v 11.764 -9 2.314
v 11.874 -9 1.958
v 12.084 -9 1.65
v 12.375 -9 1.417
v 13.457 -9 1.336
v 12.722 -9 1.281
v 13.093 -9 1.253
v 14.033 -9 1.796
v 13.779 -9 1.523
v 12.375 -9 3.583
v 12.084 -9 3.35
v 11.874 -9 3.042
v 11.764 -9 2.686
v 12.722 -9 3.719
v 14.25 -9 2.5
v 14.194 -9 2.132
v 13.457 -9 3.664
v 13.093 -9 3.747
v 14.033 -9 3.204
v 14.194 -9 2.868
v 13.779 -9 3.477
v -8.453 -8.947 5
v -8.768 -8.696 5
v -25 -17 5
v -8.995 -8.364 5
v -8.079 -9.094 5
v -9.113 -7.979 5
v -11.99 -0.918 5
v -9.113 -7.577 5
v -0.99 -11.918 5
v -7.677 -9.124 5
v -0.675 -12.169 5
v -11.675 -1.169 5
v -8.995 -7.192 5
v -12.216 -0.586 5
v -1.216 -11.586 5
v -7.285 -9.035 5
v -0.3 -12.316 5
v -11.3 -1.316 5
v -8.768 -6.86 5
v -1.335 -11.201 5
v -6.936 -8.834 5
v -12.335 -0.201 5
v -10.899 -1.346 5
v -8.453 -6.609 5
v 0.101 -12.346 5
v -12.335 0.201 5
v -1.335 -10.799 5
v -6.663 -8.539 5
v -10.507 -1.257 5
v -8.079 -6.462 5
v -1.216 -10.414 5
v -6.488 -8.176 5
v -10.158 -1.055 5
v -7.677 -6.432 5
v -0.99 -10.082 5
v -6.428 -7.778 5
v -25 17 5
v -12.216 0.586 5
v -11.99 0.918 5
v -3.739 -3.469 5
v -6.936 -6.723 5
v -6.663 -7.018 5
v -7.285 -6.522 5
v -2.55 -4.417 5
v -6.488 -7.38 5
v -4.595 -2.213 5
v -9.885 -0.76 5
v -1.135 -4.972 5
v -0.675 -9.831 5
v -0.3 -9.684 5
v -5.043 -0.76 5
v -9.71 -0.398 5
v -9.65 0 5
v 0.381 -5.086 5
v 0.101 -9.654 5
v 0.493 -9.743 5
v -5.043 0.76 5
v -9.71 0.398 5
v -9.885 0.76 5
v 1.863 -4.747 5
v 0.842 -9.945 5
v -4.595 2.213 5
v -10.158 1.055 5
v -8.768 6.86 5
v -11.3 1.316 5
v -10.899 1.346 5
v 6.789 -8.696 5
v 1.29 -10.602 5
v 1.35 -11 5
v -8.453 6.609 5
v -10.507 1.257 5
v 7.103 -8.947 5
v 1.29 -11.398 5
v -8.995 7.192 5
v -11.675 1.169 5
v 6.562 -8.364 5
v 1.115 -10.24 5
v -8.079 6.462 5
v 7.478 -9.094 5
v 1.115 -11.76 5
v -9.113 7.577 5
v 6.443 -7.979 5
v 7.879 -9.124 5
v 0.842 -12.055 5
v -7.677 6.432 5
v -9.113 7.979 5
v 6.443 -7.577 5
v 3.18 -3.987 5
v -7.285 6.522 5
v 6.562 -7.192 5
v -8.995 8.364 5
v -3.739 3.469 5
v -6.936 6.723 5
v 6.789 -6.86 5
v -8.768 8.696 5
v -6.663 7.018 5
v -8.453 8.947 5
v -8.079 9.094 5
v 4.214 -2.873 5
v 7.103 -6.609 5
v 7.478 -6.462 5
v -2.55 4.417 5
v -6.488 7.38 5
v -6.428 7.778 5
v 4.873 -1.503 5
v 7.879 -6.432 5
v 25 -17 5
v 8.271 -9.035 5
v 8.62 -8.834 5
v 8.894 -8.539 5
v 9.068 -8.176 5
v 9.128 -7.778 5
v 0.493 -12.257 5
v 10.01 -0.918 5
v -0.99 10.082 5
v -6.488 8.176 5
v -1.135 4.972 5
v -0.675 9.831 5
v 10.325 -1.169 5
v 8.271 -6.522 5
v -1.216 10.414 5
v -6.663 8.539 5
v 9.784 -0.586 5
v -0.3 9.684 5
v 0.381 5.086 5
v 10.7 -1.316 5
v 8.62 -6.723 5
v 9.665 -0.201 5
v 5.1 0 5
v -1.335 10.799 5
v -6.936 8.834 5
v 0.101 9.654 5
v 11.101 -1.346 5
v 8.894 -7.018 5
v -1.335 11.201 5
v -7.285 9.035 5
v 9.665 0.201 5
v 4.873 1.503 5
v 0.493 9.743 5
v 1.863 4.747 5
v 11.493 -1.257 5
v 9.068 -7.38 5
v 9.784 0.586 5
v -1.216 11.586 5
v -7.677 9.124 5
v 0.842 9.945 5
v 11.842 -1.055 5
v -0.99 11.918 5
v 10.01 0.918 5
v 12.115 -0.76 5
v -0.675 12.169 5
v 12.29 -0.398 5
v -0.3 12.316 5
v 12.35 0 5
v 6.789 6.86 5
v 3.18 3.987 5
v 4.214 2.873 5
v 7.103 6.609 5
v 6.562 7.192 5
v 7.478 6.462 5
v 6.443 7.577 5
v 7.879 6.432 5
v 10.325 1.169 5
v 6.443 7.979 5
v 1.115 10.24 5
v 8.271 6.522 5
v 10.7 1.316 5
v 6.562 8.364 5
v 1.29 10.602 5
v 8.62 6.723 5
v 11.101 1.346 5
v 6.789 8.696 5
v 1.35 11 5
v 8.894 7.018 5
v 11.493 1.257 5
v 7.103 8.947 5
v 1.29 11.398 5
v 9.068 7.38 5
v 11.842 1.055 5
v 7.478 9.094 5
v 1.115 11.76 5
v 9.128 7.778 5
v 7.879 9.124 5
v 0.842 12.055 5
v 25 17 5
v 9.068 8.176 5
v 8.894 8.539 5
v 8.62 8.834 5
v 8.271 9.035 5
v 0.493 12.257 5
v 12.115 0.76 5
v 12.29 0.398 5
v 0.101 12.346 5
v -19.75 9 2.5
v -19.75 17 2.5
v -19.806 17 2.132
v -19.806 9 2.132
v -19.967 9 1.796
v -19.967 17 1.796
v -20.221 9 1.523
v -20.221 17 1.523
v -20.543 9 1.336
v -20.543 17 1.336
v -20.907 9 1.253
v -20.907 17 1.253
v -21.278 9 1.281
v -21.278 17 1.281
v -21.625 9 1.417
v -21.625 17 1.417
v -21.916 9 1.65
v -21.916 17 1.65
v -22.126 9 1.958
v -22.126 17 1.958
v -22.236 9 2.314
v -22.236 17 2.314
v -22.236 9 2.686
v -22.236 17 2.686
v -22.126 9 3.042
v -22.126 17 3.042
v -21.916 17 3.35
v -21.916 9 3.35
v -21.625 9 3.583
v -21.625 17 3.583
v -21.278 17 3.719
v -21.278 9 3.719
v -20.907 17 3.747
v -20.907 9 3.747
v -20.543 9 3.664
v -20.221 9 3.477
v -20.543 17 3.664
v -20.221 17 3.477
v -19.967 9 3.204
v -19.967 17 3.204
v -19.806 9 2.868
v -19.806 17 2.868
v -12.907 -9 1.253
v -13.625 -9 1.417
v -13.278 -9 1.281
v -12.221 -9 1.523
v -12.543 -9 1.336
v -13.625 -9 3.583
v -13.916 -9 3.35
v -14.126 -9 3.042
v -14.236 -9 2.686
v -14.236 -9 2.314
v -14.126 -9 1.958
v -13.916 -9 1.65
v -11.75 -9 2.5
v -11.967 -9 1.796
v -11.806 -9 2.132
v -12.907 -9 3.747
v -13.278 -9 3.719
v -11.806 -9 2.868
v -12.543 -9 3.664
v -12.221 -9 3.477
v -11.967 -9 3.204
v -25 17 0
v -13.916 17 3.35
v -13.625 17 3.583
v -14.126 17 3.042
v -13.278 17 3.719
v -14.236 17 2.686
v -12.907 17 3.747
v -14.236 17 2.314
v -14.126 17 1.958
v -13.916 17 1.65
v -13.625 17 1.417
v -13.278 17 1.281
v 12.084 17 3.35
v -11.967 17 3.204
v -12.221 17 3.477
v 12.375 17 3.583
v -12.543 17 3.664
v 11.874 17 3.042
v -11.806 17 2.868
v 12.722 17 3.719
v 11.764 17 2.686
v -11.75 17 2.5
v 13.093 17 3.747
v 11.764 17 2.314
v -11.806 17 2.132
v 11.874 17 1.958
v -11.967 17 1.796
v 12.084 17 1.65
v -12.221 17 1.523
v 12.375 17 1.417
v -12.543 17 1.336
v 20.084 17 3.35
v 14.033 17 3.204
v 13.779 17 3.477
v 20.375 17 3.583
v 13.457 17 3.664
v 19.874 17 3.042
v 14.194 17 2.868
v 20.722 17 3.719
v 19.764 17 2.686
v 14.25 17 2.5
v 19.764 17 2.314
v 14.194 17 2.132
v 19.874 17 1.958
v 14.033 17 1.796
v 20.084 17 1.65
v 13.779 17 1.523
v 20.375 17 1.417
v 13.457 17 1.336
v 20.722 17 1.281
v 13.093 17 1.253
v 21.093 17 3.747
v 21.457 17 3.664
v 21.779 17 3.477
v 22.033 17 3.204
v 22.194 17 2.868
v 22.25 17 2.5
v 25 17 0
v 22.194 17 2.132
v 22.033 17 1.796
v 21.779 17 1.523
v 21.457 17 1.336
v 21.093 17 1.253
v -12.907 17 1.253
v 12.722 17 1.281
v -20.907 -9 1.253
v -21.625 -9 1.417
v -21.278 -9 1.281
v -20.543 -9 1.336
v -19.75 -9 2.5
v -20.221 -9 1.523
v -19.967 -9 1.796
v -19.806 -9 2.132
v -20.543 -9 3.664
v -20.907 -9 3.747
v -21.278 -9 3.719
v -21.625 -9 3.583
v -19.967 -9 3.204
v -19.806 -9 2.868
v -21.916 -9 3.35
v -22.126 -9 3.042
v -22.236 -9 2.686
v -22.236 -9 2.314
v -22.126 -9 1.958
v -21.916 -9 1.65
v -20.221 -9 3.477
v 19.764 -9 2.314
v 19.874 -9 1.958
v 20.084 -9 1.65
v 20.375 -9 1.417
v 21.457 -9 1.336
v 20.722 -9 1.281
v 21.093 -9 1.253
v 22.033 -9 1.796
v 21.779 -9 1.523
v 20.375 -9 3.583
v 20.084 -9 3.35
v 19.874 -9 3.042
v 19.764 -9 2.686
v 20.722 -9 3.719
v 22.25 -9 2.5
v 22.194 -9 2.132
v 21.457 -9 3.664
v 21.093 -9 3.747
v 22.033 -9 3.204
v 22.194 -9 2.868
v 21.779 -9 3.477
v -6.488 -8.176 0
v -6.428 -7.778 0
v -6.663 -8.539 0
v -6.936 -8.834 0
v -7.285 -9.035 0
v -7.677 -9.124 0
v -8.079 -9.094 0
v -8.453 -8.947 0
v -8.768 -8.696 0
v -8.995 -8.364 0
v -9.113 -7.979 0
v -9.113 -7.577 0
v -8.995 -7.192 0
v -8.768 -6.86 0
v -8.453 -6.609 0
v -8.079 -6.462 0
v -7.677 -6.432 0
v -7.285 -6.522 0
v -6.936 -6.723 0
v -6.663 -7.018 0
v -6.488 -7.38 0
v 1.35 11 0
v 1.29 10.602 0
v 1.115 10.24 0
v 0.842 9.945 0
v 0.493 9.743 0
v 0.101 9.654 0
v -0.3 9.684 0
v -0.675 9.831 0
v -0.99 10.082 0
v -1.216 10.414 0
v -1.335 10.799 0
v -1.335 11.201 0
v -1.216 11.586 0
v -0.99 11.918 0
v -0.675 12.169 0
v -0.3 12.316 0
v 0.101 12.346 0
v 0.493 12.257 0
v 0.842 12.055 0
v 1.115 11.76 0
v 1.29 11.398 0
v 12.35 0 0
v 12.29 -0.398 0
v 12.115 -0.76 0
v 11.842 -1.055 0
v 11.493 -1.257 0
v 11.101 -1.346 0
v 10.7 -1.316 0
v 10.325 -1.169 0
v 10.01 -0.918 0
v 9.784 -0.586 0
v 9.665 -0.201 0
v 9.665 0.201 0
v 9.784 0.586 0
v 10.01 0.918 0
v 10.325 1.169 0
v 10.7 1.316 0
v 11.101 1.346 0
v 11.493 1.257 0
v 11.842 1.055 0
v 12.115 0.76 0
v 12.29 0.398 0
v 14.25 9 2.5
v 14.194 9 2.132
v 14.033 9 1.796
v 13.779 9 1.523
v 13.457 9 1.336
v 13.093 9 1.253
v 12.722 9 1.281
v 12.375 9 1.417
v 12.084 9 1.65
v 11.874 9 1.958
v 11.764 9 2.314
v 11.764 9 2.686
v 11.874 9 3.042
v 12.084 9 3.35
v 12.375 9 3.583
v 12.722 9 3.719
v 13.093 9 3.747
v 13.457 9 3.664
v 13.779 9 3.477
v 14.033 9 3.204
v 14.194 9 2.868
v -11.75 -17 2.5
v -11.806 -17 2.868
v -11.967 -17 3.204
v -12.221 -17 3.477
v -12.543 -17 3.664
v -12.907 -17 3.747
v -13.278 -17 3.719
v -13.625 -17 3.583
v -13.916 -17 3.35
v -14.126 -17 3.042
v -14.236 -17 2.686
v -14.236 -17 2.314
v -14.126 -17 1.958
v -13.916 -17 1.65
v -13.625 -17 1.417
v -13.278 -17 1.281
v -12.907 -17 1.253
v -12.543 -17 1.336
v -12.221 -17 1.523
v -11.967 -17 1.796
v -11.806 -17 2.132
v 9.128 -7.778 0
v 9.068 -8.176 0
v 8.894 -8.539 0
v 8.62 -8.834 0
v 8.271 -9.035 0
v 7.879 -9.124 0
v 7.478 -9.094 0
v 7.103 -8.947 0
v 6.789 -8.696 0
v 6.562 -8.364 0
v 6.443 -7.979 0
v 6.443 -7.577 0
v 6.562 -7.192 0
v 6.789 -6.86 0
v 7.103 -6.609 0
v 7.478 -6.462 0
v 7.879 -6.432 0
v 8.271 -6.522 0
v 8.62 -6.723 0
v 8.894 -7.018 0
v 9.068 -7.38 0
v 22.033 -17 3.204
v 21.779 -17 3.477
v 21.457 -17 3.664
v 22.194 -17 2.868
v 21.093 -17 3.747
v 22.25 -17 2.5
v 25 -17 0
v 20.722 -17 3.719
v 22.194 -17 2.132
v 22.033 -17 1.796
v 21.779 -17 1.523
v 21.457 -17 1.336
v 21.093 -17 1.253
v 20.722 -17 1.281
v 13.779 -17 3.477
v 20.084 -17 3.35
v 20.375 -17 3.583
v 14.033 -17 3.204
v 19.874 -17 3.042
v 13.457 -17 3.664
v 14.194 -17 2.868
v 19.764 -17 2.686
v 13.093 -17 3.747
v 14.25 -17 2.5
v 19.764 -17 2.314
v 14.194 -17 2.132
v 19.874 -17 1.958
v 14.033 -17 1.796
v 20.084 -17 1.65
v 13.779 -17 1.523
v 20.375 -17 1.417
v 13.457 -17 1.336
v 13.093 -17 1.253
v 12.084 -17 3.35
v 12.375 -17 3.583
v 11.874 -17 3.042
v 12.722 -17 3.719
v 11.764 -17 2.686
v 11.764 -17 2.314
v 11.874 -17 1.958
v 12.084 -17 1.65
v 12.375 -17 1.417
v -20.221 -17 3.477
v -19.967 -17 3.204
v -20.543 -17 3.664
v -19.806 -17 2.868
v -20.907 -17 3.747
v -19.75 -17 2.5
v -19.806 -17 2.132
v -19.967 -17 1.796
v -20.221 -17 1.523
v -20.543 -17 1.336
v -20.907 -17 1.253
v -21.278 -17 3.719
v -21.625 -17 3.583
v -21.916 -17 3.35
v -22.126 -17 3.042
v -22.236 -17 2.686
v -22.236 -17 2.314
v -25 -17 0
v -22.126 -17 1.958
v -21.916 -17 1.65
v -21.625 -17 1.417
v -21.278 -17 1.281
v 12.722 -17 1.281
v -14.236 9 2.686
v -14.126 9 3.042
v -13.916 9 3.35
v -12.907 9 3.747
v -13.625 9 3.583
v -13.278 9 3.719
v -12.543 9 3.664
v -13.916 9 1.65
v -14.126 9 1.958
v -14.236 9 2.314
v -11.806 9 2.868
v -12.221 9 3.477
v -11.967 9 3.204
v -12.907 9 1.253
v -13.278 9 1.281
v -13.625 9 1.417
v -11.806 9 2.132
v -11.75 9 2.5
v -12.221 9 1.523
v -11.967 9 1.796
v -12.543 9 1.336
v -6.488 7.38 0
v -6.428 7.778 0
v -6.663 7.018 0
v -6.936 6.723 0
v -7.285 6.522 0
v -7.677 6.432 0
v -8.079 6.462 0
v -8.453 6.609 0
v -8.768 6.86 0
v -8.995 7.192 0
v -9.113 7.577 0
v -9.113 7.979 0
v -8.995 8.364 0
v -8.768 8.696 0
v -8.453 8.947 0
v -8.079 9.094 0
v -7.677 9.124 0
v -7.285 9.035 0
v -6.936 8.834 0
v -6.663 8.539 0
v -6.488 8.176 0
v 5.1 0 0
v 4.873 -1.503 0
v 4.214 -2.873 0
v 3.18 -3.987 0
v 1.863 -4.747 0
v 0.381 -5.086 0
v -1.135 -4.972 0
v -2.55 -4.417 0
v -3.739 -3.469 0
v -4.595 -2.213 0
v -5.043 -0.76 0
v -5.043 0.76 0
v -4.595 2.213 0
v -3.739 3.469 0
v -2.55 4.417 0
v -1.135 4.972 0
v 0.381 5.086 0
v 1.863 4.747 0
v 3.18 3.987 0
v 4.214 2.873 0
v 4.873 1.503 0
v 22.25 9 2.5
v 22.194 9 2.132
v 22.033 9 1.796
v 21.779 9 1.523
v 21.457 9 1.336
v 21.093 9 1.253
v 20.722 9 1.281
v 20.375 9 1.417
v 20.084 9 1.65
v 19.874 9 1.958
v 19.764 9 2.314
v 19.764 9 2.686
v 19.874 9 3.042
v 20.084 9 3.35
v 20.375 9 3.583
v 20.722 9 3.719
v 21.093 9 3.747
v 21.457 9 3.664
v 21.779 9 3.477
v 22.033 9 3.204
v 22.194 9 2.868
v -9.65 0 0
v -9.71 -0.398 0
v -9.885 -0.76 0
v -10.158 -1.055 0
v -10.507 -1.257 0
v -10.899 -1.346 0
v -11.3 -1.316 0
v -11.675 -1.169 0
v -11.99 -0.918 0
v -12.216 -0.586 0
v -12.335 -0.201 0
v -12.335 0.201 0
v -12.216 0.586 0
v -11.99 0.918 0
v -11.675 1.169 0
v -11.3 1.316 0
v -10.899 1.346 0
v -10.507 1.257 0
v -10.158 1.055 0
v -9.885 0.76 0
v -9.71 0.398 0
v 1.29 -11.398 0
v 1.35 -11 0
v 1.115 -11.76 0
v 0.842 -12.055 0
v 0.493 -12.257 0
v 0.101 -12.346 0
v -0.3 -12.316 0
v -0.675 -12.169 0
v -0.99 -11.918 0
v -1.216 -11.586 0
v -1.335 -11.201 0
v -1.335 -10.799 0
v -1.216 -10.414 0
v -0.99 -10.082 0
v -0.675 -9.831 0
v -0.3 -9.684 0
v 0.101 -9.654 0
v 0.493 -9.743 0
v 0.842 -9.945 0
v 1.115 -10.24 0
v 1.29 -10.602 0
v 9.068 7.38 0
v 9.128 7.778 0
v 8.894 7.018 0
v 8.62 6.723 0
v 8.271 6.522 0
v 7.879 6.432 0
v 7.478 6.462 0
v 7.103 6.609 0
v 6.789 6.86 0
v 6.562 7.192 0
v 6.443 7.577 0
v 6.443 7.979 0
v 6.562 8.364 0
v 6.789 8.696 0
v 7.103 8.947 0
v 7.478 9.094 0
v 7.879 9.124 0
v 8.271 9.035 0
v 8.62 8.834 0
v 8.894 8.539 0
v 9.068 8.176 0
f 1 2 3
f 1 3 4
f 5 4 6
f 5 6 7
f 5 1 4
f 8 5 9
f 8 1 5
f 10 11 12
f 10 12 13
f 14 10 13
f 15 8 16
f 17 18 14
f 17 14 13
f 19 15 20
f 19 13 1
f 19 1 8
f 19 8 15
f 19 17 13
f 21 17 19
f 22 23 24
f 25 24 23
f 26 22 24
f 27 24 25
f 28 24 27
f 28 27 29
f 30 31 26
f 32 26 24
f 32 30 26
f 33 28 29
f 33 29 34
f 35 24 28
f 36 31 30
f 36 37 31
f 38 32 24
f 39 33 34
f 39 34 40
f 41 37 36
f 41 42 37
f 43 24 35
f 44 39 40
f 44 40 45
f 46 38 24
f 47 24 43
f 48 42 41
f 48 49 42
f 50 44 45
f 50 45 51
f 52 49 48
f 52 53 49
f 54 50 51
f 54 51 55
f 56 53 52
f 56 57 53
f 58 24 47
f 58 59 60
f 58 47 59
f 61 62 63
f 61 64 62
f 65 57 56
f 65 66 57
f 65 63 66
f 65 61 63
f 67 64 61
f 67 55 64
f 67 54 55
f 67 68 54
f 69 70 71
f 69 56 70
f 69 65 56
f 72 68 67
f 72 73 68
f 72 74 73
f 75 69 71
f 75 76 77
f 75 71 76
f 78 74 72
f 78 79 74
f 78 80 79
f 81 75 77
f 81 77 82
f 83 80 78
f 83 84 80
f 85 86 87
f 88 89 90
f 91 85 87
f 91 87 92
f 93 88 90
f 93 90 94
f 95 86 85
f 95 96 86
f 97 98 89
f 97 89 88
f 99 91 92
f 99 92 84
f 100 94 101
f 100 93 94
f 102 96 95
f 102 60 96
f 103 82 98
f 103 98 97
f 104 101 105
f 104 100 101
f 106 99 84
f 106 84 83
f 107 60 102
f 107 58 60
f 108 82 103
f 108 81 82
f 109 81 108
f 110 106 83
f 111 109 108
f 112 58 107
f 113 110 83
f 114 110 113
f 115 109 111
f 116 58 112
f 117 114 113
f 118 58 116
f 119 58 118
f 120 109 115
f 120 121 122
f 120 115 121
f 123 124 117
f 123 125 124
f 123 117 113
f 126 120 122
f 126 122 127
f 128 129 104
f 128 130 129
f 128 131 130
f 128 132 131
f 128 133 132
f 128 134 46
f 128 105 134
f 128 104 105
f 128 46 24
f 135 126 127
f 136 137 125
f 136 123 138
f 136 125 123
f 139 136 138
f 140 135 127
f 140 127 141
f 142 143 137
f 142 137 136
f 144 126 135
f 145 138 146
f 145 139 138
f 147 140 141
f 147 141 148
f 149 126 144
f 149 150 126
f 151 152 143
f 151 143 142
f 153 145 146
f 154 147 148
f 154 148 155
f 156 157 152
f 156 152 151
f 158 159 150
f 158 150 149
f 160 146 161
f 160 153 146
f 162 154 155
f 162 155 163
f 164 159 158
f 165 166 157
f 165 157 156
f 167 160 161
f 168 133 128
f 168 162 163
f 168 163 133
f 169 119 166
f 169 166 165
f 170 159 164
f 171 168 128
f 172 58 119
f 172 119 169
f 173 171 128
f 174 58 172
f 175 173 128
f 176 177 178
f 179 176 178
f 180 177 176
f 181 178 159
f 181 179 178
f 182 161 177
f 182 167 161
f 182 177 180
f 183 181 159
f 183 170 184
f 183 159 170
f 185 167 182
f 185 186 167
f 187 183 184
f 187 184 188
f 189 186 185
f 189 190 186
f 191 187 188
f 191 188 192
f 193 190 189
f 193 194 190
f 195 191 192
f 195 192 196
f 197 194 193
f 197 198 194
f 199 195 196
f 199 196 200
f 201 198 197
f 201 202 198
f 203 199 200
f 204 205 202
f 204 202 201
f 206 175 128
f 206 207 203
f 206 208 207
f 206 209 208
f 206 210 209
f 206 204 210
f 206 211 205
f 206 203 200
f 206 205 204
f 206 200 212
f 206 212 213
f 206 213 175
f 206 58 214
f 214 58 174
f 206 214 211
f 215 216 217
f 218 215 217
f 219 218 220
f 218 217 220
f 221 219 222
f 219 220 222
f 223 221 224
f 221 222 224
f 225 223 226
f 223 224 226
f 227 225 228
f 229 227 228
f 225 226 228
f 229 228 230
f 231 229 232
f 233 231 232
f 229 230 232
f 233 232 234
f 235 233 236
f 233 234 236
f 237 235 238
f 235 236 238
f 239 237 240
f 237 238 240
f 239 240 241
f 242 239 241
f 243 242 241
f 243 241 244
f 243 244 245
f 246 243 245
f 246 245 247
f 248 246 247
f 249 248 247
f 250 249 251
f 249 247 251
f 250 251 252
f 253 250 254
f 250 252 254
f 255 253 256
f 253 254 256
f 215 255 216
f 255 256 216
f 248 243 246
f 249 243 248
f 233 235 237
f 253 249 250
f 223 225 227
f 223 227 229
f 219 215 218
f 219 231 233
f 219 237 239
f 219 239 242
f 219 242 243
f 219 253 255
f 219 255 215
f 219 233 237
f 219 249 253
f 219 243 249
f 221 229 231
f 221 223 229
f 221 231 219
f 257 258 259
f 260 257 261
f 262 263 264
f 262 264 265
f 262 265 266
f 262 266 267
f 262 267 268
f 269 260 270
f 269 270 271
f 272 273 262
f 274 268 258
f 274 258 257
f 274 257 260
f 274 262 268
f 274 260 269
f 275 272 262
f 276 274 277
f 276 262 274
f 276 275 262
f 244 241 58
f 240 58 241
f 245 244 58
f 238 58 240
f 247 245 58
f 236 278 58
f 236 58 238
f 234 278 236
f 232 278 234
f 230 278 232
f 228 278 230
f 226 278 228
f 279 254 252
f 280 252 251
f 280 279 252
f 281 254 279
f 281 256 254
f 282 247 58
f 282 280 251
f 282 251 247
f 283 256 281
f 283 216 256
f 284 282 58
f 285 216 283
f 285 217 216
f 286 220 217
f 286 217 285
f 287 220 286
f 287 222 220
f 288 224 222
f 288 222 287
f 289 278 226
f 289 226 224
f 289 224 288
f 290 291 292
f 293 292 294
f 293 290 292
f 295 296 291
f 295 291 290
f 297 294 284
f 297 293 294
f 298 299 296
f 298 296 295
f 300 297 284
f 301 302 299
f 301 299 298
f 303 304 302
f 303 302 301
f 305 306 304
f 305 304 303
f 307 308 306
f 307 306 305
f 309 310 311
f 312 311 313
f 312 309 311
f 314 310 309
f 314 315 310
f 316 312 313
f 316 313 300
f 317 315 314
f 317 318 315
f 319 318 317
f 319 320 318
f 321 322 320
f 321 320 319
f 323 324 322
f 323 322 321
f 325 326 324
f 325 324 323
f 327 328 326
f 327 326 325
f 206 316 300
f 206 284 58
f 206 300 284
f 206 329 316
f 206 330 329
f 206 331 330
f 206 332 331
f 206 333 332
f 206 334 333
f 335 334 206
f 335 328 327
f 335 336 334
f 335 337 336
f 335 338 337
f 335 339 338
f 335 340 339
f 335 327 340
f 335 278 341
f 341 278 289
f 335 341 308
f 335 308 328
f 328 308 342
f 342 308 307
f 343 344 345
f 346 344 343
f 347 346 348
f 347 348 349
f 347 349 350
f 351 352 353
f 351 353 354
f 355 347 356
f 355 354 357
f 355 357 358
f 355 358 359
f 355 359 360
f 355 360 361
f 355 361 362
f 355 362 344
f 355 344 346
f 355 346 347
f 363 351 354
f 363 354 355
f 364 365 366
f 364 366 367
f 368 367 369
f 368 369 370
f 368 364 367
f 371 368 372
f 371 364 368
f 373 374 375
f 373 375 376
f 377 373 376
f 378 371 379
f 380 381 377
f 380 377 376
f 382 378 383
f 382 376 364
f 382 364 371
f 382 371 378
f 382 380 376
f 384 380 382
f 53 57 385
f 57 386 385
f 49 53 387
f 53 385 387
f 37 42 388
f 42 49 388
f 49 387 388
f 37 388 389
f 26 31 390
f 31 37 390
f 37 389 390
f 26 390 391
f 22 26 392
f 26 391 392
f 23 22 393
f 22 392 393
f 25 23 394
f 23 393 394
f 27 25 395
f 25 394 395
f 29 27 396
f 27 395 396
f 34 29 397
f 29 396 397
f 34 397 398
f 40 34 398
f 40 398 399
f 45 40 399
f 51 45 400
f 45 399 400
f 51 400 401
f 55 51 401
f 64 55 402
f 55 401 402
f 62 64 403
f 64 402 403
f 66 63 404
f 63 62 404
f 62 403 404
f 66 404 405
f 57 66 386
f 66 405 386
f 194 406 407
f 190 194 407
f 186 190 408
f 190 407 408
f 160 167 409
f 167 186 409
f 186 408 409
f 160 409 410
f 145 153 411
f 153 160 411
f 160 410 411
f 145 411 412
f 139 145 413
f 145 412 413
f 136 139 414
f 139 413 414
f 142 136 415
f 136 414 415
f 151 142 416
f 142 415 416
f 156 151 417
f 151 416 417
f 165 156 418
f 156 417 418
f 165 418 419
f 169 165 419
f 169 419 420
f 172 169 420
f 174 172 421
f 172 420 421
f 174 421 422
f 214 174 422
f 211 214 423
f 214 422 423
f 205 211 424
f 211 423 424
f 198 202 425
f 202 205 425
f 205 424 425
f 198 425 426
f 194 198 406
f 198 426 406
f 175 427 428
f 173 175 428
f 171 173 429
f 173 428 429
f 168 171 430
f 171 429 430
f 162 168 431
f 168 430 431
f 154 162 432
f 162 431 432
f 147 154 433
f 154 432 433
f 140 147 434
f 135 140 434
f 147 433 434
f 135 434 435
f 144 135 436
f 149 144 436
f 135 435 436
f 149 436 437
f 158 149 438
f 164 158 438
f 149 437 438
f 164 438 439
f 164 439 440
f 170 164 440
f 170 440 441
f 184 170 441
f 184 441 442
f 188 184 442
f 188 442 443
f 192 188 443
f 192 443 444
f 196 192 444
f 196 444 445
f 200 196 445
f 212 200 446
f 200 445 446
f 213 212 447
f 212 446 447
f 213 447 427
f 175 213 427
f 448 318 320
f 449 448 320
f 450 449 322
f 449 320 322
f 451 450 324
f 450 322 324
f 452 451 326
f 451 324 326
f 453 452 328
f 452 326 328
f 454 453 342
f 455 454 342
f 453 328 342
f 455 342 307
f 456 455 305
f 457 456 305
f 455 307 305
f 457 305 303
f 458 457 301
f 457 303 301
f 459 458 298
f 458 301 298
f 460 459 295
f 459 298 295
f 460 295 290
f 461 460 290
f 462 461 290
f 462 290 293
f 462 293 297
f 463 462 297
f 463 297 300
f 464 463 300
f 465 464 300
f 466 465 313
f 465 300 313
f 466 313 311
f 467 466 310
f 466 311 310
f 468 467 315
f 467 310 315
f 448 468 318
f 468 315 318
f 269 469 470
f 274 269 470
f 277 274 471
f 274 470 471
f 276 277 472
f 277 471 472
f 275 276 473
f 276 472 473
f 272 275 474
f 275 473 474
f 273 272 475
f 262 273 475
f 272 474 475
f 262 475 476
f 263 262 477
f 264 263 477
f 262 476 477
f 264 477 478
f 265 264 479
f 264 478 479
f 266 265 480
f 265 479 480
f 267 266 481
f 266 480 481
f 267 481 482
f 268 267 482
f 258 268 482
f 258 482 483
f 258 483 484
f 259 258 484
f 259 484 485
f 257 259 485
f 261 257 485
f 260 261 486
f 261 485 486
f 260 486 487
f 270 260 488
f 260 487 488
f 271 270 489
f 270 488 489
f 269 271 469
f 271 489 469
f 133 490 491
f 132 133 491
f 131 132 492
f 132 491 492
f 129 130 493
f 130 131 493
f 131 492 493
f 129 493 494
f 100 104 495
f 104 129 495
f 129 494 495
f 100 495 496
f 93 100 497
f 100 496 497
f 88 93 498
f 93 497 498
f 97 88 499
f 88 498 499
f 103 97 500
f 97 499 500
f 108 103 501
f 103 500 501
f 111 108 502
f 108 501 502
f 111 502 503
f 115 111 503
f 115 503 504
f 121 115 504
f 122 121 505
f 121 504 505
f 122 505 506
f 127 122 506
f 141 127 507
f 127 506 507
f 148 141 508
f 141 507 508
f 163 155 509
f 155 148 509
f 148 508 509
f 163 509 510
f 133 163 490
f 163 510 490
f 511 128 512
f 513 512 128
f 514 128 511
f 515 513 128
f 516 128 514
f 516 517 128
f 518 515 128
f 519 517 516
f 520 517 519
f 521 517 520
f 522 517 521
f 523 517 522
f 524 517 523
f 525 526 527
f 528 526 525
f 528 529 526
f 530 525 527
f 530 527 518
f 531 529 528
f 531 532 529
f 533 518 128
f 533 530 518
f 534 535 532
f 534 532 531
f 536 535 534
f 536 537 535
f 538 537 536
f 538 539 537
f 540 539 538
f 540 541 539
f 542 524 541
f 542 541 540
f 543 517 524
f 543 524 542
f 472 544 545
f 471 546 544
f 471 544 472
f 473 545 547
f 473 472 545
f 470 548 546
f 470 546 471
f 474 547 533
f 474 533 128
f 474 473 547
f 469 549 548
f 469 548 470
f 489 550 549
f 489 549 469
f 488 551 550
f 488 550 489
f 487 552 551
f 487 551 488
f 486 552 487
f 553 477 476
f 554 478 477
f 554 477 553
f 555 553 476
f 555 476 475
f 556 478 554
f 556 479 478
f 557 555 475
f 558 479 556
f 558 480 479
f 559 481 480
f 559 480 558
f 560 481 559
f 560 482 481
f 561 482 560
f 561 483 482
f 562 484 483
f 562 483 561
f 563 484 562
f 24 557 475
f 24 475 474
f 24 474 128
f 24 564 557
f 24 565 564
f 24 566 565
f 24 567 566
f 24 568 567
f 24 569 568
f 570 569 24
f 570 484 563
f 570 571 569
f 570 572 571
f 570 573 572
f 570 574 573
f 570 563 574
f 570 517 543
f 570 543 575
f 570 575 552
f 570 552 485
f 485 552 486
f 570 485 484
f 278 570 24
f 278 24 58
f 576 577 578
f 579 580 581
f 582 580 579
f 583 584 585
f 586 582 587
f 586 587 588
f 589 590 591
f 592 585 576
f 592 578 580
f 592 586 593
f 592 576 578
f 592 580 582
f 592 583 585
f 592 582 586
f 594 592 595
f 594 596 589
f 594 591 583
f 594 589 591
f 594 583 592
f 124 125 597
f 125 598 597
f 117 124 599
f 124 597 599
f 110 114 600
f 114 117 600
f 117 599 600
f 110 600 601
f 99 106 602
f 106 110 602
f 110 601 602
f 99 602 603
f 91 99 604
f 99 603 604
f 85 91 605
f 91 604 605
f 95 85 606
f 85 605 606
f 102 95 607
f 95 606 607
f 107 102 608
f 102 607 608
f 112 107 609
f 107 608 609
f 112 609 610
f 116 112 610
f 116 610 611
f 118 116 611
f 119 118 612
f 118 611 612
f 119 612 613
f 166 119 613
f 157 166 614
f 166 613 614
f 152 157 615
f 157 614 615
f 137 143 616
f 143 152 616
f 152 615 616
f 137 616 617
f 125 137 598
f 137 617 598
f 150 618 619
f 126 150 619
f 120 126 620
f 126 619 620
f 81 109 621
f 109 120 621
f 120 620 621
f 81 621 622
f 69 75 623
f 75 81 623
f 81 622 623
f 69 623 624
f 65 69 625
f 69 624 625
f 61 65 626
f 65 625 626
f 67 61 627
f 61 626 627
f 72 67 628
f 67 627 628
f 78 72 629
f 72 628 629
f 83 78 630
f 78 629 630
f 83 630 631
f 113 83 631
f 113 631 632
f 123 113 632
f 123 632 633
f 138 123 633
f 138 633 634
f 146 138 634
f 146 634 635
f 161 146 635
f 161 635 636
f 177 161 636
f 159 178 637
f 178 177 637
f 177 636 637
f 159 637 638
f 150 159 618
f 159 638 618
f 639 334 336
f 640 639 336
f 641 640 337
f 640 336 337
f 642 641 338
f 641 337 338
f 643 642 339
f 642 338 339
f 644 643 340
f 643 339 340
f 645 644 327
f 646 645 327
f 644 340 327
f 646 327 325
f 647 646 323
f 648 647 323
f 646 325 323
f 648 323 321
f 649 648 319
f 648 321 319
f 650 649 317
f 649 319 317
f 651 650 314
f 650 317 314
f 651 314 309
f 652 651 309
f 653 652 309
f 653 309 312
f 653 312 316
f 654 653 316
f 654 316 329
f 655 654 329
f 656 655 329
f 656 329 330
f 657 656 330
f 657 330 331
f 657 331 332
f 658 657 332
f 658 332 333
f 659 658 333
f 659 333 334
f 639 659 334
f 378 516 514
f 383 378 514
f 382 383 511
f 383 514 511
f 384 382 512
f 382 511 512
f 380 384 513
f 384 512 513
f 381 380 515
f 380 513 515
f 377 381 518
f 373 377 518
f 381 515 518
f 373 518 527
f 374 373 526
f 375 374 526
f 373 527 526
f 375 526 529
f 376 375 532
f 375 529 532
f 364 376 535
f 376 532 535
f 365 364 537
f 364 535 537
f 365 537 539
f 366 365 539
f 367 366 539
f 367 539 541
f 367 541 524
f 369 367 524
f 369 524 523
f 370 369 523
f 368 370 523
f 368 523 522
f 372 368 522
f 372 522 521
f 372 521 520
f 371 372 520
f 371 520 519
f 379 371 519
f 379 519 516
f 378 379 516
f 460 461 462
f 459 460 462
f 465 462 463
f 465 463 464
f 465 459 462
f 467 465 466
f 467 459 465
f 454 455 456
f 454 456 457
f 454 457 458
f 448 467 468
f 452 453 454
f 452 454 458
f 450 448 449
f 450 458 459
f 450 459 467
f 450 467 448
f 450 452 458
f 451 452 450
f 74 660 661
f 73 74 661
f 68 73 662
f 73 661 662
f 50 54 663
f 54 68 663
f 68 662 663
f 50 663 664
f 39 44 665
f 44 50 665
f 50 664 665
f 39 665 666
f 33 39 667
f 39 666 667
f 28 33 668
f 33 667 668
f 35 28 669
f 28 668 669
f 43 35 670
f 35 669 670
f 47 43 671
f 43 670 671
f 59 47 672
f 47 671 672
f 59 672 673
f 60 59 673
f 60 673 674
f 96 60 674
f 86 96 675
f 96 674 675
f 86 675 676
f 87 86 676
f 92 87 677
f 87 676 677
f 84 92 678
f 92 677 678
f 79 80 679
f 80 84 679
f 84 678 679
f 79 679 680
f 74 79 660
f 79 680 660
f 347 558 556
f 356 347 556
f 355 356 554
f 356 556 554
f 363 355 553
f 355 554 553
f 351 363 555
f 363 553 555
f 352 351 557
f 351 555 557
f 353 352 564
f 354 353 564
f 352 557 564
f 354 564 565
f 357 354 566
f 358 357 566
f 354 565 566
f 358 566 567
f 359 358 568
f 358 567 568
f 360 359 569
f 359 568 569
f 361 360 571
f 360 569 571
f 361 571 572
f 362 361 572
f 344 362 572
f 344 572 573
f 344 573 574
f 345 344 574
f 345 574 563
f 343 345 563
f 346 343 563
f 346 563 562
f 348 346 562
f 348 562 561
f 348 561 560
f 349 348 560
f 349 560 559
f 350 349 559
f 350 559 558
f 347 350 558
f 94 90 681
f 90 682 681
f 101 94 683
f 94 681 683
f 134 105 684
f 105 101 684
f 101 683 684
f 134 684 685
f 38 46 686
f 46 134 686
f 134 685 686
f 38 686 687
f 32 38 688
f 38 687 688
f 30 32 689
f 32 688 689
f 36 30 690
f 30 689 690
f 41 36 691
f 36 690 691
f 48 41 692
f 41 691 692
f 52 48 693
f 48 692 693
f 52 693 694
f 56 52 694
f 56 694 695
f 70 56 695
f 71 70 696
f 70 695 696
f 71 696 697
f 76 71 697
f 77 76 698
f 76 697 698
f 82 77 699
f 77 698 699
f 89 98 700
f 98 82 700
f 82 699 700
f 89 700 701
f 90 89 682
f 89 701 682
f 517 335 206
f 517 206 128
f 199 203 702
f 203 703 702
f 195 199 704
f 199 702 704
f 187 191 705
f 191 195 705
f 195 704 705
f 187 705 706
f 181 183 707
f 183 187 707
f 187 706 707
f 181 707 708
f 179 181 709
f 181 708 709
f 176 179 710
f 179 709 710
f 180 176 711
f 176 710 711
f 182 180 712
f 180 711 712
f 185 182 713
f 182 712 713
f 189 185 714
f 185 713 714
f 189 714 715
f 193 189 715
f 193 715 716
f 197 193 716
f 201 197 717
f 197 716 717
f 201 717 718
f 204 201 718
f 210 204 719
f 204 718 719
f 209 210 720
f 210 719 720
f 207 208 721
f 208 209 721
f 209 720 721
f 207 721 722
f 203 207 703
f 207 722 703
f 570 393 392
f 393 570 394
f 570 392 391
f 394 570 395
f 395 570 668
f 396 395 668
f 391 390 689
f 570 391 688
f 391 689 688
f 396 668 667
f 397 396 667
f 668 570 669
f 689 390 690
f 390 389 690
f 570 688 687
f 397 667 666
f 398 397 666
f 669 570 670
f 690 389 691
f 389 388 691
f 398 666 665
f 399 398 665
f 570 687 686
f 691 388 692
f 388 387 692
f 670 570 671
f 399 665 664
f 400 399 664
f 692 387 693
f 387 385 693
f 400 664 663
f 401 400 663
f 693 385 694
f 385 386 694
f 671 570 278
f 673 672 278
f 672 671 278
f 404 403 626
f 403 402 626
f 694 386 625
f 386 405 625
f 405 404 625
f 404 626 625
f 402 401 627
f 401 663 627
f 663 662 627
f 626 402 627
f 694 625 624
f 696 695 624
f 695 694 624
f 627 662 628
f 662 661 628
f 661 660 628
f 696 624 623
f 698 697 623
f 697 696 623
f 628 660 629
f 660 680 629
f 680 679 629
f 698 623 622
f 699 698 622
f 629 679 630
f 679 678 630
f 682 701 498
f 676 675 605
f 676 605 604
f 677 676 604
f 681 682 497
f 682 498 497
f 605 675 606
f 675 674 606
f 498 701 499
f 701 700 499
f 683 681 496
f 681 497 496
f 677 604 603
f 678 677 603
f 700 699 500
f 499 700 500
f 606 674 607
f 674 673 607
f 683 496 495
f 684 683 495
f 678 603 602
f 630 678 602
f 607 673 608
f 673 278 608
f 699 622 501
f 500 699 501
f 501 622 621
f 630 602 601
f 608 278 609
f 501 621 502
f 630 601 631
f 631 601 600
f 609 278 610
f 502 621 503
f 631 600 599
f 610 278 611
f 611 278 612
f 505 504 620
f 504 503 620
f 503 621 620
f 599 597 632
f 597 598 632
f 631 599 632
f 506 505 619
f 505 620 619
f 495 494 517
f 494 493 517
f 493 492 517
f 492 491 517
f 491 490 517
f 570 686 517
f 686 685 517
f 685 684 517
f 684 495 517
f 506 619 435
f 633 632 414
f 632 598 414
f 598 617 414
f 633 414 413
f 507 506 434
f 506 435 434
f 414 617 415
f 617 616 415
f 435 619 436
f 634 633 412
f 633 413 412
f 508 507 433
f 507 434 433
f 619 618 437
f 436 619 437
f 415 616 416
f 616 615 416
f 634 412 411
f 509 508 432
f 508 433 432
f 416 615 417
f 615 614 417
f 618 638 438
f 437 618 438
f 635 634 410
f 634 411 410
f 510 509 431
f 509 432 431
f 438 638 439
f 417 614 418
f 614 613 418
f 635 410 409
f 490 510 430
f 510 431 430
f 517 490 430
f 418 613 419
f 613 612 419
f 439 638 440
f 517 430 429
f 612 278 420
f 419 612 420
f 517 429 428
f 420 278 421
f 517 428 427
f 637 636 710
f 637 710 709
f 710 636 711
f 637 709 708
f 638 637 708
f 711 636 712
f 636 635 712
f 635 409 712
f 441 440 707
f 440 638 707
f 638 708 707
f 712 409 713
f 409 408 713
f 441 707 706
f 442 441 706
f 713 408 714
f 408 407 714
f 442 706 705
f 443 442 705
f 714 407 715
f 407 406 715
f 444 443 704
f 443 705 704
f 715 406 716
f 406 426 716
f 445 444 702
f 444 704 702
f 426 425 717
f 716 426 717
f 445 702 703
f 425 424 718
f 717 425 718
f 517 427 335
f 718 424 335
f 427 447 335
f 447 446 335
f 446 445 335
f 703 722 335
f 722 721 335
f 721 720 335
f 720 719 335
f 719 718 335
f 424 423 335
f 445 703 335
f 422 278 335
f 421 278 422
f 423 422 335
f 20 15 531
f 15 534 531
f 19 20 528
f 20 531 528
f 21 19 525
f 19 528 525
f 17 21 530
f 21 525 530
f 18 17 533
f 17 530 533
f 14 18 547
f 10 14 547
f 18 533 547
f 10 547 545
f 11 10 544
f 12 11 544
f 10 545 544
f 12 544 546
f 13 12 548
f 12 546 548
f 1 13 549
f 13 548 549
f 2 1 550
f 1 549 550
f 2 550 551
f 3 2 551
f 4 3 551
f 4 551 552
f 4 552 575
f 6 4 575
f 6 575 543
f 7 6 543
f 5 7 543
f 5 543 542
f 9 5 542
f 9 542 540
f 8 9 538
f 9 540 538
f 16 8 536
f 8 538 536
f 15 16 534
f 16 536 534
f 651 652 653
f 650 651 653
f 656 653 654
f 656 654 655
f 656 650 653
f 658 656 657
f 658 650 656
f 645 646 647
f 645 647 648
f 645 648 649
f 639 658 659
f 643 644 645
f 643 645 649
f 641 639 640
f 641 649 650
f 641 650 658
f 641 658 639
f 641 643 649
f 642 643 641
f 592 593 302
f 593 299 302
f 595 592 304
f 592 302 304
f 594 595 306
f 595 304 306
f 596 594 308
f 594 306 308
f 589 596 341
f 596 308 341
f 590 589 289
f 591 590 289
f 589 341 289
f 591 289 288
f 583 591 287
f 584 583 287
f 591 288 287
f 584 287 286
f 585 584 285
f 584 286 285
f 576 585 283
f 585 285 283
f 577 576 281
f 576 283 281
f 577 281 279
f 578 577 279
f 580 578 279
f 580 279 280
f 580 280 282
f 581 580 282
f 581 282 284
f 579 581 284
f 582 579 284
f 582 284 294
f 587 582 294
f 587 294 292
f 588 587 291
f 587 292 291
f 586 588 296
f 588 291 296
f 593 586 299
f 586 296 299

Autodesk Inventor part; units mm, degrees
ref_plane "YZ Plane" through (0, 0, 0) normal (1, 0, 0) x (0, 1, 0)
ref_plane "XZ Plane" through (0, 0, 0) normal (0, 1, 0) x (-1, 0, 0)
ref_plane "XY Plane" through (0, 0, 0) normal (0, 0, 1) x (1, 0, 0)
sketch "스케치1" plane through (0, 0, 0) normal (0, 0, 1) x (1, 0, 0)
  line L0 (-25, 17) -> (25, 17)
  line L1 (25, 17) -> (25, -17)
  line L2 (25, -17) -> (-25, -17)
  line L3 (-25, -17) -> (-25, 17)
  circle A0 centre (0, 0) radius 5.1
  line L4 (0, 0) -> (11, 0)
  line L5 (0, 0) -> (11, 0) construction
  circle A1 centre (11, 0) radius 1.35
  circle A2 centre (7.7782, 7.7782) radius 1.35
  circle A3 centre (0, 11) radius 1.35
  circle A4 centre (-7.7782, 7.7782) radius 1.35
  circle A5 centre (-11, 0) radius 1.35
  circle A6 centre (-7.7782, -7.7782) radius 1.35
  circle A7 centre (0, -11) radius 1.35
  circle A8 centre (7.7782, -7.7782) radius 1.35
  dimension "d0" = 50
  dimension "d1" = 34
  dimension "d2" = 17
  dimension "d3" = 25
  dimension "d4" = 10.2
  dimension "d5" = 11
  dimension "d6" = 0
  dimension "d7" = 2.7
  dimension "d10" = 360
extrude "돌출1" add sketch "스케치1" along normal blind 5
sketch "스케치2" plane through (-25, -17, 0) normal (0, -1, 0) x (1, 0, 0)
  circle A0 centre (4, 2.5) radius 1.25
  circle A1 centre (12, 2.5) radius 1.25
  circle A2 centre (38, 2.5) radius 1.25
  circle A3 centre (46, 2.5) radius 1.25
  line L0 (50, 0) -> (0, 0) projected
  line L1 (0, 0) -> (0, 5) projected
  line L2 (50, 0) -> (50, 5) projected
  point P0 (25, 0)
  dimension "d14" = 2.5
  dimension "d15" = 2.5
  dimension "d16" = 2.5
  dimension "d17" = 2.5
  dimension "d18" = 2.5
  dimension "d19" = 2.5
  dimension "d20" = 2.5
  dimension "d21" = 2.5
  dimension "d22" = 4
  dimension "d23" = 8
  dimension "d24" = 4
  dimension "d25" = 8
extrude "돌출2" cut sketch "스케치2" against normal blind 8
sketch "스케치3" plane through (-25, 17, 0) normal (0, 1, 0) x (1, 0, 0)
  circle A0 centre (38, -2.5) radius 1.25 projected
  circle A1 centre (4, -2.5) radius 1.25 projected
  circle A2 centre (12, -2.5) radius 1.25 projected
  circle A3 centre (46, -2.5) radius 1.25 projected
  line L0 (50, 0) -> (0, 0) projected
  line L1 (50, 0) -> (50, -5) projected
  line L2 (0, -5) -> (50, -5) projected
  line L3 (0, 0) -> (0, -5) projected
  point P0 (25, 0)
extrude "돌출3" cut sketch "스케치3" against normal blind 8 contours A0 | A1 | A2 | A3
equation "\"d2\" = 0.5 * d1"
equation "\"d3\" = 0.5 * d0"
equation "\"d25\" = d23"
properties part number "Box_Top" material "알루미늄 6061"
